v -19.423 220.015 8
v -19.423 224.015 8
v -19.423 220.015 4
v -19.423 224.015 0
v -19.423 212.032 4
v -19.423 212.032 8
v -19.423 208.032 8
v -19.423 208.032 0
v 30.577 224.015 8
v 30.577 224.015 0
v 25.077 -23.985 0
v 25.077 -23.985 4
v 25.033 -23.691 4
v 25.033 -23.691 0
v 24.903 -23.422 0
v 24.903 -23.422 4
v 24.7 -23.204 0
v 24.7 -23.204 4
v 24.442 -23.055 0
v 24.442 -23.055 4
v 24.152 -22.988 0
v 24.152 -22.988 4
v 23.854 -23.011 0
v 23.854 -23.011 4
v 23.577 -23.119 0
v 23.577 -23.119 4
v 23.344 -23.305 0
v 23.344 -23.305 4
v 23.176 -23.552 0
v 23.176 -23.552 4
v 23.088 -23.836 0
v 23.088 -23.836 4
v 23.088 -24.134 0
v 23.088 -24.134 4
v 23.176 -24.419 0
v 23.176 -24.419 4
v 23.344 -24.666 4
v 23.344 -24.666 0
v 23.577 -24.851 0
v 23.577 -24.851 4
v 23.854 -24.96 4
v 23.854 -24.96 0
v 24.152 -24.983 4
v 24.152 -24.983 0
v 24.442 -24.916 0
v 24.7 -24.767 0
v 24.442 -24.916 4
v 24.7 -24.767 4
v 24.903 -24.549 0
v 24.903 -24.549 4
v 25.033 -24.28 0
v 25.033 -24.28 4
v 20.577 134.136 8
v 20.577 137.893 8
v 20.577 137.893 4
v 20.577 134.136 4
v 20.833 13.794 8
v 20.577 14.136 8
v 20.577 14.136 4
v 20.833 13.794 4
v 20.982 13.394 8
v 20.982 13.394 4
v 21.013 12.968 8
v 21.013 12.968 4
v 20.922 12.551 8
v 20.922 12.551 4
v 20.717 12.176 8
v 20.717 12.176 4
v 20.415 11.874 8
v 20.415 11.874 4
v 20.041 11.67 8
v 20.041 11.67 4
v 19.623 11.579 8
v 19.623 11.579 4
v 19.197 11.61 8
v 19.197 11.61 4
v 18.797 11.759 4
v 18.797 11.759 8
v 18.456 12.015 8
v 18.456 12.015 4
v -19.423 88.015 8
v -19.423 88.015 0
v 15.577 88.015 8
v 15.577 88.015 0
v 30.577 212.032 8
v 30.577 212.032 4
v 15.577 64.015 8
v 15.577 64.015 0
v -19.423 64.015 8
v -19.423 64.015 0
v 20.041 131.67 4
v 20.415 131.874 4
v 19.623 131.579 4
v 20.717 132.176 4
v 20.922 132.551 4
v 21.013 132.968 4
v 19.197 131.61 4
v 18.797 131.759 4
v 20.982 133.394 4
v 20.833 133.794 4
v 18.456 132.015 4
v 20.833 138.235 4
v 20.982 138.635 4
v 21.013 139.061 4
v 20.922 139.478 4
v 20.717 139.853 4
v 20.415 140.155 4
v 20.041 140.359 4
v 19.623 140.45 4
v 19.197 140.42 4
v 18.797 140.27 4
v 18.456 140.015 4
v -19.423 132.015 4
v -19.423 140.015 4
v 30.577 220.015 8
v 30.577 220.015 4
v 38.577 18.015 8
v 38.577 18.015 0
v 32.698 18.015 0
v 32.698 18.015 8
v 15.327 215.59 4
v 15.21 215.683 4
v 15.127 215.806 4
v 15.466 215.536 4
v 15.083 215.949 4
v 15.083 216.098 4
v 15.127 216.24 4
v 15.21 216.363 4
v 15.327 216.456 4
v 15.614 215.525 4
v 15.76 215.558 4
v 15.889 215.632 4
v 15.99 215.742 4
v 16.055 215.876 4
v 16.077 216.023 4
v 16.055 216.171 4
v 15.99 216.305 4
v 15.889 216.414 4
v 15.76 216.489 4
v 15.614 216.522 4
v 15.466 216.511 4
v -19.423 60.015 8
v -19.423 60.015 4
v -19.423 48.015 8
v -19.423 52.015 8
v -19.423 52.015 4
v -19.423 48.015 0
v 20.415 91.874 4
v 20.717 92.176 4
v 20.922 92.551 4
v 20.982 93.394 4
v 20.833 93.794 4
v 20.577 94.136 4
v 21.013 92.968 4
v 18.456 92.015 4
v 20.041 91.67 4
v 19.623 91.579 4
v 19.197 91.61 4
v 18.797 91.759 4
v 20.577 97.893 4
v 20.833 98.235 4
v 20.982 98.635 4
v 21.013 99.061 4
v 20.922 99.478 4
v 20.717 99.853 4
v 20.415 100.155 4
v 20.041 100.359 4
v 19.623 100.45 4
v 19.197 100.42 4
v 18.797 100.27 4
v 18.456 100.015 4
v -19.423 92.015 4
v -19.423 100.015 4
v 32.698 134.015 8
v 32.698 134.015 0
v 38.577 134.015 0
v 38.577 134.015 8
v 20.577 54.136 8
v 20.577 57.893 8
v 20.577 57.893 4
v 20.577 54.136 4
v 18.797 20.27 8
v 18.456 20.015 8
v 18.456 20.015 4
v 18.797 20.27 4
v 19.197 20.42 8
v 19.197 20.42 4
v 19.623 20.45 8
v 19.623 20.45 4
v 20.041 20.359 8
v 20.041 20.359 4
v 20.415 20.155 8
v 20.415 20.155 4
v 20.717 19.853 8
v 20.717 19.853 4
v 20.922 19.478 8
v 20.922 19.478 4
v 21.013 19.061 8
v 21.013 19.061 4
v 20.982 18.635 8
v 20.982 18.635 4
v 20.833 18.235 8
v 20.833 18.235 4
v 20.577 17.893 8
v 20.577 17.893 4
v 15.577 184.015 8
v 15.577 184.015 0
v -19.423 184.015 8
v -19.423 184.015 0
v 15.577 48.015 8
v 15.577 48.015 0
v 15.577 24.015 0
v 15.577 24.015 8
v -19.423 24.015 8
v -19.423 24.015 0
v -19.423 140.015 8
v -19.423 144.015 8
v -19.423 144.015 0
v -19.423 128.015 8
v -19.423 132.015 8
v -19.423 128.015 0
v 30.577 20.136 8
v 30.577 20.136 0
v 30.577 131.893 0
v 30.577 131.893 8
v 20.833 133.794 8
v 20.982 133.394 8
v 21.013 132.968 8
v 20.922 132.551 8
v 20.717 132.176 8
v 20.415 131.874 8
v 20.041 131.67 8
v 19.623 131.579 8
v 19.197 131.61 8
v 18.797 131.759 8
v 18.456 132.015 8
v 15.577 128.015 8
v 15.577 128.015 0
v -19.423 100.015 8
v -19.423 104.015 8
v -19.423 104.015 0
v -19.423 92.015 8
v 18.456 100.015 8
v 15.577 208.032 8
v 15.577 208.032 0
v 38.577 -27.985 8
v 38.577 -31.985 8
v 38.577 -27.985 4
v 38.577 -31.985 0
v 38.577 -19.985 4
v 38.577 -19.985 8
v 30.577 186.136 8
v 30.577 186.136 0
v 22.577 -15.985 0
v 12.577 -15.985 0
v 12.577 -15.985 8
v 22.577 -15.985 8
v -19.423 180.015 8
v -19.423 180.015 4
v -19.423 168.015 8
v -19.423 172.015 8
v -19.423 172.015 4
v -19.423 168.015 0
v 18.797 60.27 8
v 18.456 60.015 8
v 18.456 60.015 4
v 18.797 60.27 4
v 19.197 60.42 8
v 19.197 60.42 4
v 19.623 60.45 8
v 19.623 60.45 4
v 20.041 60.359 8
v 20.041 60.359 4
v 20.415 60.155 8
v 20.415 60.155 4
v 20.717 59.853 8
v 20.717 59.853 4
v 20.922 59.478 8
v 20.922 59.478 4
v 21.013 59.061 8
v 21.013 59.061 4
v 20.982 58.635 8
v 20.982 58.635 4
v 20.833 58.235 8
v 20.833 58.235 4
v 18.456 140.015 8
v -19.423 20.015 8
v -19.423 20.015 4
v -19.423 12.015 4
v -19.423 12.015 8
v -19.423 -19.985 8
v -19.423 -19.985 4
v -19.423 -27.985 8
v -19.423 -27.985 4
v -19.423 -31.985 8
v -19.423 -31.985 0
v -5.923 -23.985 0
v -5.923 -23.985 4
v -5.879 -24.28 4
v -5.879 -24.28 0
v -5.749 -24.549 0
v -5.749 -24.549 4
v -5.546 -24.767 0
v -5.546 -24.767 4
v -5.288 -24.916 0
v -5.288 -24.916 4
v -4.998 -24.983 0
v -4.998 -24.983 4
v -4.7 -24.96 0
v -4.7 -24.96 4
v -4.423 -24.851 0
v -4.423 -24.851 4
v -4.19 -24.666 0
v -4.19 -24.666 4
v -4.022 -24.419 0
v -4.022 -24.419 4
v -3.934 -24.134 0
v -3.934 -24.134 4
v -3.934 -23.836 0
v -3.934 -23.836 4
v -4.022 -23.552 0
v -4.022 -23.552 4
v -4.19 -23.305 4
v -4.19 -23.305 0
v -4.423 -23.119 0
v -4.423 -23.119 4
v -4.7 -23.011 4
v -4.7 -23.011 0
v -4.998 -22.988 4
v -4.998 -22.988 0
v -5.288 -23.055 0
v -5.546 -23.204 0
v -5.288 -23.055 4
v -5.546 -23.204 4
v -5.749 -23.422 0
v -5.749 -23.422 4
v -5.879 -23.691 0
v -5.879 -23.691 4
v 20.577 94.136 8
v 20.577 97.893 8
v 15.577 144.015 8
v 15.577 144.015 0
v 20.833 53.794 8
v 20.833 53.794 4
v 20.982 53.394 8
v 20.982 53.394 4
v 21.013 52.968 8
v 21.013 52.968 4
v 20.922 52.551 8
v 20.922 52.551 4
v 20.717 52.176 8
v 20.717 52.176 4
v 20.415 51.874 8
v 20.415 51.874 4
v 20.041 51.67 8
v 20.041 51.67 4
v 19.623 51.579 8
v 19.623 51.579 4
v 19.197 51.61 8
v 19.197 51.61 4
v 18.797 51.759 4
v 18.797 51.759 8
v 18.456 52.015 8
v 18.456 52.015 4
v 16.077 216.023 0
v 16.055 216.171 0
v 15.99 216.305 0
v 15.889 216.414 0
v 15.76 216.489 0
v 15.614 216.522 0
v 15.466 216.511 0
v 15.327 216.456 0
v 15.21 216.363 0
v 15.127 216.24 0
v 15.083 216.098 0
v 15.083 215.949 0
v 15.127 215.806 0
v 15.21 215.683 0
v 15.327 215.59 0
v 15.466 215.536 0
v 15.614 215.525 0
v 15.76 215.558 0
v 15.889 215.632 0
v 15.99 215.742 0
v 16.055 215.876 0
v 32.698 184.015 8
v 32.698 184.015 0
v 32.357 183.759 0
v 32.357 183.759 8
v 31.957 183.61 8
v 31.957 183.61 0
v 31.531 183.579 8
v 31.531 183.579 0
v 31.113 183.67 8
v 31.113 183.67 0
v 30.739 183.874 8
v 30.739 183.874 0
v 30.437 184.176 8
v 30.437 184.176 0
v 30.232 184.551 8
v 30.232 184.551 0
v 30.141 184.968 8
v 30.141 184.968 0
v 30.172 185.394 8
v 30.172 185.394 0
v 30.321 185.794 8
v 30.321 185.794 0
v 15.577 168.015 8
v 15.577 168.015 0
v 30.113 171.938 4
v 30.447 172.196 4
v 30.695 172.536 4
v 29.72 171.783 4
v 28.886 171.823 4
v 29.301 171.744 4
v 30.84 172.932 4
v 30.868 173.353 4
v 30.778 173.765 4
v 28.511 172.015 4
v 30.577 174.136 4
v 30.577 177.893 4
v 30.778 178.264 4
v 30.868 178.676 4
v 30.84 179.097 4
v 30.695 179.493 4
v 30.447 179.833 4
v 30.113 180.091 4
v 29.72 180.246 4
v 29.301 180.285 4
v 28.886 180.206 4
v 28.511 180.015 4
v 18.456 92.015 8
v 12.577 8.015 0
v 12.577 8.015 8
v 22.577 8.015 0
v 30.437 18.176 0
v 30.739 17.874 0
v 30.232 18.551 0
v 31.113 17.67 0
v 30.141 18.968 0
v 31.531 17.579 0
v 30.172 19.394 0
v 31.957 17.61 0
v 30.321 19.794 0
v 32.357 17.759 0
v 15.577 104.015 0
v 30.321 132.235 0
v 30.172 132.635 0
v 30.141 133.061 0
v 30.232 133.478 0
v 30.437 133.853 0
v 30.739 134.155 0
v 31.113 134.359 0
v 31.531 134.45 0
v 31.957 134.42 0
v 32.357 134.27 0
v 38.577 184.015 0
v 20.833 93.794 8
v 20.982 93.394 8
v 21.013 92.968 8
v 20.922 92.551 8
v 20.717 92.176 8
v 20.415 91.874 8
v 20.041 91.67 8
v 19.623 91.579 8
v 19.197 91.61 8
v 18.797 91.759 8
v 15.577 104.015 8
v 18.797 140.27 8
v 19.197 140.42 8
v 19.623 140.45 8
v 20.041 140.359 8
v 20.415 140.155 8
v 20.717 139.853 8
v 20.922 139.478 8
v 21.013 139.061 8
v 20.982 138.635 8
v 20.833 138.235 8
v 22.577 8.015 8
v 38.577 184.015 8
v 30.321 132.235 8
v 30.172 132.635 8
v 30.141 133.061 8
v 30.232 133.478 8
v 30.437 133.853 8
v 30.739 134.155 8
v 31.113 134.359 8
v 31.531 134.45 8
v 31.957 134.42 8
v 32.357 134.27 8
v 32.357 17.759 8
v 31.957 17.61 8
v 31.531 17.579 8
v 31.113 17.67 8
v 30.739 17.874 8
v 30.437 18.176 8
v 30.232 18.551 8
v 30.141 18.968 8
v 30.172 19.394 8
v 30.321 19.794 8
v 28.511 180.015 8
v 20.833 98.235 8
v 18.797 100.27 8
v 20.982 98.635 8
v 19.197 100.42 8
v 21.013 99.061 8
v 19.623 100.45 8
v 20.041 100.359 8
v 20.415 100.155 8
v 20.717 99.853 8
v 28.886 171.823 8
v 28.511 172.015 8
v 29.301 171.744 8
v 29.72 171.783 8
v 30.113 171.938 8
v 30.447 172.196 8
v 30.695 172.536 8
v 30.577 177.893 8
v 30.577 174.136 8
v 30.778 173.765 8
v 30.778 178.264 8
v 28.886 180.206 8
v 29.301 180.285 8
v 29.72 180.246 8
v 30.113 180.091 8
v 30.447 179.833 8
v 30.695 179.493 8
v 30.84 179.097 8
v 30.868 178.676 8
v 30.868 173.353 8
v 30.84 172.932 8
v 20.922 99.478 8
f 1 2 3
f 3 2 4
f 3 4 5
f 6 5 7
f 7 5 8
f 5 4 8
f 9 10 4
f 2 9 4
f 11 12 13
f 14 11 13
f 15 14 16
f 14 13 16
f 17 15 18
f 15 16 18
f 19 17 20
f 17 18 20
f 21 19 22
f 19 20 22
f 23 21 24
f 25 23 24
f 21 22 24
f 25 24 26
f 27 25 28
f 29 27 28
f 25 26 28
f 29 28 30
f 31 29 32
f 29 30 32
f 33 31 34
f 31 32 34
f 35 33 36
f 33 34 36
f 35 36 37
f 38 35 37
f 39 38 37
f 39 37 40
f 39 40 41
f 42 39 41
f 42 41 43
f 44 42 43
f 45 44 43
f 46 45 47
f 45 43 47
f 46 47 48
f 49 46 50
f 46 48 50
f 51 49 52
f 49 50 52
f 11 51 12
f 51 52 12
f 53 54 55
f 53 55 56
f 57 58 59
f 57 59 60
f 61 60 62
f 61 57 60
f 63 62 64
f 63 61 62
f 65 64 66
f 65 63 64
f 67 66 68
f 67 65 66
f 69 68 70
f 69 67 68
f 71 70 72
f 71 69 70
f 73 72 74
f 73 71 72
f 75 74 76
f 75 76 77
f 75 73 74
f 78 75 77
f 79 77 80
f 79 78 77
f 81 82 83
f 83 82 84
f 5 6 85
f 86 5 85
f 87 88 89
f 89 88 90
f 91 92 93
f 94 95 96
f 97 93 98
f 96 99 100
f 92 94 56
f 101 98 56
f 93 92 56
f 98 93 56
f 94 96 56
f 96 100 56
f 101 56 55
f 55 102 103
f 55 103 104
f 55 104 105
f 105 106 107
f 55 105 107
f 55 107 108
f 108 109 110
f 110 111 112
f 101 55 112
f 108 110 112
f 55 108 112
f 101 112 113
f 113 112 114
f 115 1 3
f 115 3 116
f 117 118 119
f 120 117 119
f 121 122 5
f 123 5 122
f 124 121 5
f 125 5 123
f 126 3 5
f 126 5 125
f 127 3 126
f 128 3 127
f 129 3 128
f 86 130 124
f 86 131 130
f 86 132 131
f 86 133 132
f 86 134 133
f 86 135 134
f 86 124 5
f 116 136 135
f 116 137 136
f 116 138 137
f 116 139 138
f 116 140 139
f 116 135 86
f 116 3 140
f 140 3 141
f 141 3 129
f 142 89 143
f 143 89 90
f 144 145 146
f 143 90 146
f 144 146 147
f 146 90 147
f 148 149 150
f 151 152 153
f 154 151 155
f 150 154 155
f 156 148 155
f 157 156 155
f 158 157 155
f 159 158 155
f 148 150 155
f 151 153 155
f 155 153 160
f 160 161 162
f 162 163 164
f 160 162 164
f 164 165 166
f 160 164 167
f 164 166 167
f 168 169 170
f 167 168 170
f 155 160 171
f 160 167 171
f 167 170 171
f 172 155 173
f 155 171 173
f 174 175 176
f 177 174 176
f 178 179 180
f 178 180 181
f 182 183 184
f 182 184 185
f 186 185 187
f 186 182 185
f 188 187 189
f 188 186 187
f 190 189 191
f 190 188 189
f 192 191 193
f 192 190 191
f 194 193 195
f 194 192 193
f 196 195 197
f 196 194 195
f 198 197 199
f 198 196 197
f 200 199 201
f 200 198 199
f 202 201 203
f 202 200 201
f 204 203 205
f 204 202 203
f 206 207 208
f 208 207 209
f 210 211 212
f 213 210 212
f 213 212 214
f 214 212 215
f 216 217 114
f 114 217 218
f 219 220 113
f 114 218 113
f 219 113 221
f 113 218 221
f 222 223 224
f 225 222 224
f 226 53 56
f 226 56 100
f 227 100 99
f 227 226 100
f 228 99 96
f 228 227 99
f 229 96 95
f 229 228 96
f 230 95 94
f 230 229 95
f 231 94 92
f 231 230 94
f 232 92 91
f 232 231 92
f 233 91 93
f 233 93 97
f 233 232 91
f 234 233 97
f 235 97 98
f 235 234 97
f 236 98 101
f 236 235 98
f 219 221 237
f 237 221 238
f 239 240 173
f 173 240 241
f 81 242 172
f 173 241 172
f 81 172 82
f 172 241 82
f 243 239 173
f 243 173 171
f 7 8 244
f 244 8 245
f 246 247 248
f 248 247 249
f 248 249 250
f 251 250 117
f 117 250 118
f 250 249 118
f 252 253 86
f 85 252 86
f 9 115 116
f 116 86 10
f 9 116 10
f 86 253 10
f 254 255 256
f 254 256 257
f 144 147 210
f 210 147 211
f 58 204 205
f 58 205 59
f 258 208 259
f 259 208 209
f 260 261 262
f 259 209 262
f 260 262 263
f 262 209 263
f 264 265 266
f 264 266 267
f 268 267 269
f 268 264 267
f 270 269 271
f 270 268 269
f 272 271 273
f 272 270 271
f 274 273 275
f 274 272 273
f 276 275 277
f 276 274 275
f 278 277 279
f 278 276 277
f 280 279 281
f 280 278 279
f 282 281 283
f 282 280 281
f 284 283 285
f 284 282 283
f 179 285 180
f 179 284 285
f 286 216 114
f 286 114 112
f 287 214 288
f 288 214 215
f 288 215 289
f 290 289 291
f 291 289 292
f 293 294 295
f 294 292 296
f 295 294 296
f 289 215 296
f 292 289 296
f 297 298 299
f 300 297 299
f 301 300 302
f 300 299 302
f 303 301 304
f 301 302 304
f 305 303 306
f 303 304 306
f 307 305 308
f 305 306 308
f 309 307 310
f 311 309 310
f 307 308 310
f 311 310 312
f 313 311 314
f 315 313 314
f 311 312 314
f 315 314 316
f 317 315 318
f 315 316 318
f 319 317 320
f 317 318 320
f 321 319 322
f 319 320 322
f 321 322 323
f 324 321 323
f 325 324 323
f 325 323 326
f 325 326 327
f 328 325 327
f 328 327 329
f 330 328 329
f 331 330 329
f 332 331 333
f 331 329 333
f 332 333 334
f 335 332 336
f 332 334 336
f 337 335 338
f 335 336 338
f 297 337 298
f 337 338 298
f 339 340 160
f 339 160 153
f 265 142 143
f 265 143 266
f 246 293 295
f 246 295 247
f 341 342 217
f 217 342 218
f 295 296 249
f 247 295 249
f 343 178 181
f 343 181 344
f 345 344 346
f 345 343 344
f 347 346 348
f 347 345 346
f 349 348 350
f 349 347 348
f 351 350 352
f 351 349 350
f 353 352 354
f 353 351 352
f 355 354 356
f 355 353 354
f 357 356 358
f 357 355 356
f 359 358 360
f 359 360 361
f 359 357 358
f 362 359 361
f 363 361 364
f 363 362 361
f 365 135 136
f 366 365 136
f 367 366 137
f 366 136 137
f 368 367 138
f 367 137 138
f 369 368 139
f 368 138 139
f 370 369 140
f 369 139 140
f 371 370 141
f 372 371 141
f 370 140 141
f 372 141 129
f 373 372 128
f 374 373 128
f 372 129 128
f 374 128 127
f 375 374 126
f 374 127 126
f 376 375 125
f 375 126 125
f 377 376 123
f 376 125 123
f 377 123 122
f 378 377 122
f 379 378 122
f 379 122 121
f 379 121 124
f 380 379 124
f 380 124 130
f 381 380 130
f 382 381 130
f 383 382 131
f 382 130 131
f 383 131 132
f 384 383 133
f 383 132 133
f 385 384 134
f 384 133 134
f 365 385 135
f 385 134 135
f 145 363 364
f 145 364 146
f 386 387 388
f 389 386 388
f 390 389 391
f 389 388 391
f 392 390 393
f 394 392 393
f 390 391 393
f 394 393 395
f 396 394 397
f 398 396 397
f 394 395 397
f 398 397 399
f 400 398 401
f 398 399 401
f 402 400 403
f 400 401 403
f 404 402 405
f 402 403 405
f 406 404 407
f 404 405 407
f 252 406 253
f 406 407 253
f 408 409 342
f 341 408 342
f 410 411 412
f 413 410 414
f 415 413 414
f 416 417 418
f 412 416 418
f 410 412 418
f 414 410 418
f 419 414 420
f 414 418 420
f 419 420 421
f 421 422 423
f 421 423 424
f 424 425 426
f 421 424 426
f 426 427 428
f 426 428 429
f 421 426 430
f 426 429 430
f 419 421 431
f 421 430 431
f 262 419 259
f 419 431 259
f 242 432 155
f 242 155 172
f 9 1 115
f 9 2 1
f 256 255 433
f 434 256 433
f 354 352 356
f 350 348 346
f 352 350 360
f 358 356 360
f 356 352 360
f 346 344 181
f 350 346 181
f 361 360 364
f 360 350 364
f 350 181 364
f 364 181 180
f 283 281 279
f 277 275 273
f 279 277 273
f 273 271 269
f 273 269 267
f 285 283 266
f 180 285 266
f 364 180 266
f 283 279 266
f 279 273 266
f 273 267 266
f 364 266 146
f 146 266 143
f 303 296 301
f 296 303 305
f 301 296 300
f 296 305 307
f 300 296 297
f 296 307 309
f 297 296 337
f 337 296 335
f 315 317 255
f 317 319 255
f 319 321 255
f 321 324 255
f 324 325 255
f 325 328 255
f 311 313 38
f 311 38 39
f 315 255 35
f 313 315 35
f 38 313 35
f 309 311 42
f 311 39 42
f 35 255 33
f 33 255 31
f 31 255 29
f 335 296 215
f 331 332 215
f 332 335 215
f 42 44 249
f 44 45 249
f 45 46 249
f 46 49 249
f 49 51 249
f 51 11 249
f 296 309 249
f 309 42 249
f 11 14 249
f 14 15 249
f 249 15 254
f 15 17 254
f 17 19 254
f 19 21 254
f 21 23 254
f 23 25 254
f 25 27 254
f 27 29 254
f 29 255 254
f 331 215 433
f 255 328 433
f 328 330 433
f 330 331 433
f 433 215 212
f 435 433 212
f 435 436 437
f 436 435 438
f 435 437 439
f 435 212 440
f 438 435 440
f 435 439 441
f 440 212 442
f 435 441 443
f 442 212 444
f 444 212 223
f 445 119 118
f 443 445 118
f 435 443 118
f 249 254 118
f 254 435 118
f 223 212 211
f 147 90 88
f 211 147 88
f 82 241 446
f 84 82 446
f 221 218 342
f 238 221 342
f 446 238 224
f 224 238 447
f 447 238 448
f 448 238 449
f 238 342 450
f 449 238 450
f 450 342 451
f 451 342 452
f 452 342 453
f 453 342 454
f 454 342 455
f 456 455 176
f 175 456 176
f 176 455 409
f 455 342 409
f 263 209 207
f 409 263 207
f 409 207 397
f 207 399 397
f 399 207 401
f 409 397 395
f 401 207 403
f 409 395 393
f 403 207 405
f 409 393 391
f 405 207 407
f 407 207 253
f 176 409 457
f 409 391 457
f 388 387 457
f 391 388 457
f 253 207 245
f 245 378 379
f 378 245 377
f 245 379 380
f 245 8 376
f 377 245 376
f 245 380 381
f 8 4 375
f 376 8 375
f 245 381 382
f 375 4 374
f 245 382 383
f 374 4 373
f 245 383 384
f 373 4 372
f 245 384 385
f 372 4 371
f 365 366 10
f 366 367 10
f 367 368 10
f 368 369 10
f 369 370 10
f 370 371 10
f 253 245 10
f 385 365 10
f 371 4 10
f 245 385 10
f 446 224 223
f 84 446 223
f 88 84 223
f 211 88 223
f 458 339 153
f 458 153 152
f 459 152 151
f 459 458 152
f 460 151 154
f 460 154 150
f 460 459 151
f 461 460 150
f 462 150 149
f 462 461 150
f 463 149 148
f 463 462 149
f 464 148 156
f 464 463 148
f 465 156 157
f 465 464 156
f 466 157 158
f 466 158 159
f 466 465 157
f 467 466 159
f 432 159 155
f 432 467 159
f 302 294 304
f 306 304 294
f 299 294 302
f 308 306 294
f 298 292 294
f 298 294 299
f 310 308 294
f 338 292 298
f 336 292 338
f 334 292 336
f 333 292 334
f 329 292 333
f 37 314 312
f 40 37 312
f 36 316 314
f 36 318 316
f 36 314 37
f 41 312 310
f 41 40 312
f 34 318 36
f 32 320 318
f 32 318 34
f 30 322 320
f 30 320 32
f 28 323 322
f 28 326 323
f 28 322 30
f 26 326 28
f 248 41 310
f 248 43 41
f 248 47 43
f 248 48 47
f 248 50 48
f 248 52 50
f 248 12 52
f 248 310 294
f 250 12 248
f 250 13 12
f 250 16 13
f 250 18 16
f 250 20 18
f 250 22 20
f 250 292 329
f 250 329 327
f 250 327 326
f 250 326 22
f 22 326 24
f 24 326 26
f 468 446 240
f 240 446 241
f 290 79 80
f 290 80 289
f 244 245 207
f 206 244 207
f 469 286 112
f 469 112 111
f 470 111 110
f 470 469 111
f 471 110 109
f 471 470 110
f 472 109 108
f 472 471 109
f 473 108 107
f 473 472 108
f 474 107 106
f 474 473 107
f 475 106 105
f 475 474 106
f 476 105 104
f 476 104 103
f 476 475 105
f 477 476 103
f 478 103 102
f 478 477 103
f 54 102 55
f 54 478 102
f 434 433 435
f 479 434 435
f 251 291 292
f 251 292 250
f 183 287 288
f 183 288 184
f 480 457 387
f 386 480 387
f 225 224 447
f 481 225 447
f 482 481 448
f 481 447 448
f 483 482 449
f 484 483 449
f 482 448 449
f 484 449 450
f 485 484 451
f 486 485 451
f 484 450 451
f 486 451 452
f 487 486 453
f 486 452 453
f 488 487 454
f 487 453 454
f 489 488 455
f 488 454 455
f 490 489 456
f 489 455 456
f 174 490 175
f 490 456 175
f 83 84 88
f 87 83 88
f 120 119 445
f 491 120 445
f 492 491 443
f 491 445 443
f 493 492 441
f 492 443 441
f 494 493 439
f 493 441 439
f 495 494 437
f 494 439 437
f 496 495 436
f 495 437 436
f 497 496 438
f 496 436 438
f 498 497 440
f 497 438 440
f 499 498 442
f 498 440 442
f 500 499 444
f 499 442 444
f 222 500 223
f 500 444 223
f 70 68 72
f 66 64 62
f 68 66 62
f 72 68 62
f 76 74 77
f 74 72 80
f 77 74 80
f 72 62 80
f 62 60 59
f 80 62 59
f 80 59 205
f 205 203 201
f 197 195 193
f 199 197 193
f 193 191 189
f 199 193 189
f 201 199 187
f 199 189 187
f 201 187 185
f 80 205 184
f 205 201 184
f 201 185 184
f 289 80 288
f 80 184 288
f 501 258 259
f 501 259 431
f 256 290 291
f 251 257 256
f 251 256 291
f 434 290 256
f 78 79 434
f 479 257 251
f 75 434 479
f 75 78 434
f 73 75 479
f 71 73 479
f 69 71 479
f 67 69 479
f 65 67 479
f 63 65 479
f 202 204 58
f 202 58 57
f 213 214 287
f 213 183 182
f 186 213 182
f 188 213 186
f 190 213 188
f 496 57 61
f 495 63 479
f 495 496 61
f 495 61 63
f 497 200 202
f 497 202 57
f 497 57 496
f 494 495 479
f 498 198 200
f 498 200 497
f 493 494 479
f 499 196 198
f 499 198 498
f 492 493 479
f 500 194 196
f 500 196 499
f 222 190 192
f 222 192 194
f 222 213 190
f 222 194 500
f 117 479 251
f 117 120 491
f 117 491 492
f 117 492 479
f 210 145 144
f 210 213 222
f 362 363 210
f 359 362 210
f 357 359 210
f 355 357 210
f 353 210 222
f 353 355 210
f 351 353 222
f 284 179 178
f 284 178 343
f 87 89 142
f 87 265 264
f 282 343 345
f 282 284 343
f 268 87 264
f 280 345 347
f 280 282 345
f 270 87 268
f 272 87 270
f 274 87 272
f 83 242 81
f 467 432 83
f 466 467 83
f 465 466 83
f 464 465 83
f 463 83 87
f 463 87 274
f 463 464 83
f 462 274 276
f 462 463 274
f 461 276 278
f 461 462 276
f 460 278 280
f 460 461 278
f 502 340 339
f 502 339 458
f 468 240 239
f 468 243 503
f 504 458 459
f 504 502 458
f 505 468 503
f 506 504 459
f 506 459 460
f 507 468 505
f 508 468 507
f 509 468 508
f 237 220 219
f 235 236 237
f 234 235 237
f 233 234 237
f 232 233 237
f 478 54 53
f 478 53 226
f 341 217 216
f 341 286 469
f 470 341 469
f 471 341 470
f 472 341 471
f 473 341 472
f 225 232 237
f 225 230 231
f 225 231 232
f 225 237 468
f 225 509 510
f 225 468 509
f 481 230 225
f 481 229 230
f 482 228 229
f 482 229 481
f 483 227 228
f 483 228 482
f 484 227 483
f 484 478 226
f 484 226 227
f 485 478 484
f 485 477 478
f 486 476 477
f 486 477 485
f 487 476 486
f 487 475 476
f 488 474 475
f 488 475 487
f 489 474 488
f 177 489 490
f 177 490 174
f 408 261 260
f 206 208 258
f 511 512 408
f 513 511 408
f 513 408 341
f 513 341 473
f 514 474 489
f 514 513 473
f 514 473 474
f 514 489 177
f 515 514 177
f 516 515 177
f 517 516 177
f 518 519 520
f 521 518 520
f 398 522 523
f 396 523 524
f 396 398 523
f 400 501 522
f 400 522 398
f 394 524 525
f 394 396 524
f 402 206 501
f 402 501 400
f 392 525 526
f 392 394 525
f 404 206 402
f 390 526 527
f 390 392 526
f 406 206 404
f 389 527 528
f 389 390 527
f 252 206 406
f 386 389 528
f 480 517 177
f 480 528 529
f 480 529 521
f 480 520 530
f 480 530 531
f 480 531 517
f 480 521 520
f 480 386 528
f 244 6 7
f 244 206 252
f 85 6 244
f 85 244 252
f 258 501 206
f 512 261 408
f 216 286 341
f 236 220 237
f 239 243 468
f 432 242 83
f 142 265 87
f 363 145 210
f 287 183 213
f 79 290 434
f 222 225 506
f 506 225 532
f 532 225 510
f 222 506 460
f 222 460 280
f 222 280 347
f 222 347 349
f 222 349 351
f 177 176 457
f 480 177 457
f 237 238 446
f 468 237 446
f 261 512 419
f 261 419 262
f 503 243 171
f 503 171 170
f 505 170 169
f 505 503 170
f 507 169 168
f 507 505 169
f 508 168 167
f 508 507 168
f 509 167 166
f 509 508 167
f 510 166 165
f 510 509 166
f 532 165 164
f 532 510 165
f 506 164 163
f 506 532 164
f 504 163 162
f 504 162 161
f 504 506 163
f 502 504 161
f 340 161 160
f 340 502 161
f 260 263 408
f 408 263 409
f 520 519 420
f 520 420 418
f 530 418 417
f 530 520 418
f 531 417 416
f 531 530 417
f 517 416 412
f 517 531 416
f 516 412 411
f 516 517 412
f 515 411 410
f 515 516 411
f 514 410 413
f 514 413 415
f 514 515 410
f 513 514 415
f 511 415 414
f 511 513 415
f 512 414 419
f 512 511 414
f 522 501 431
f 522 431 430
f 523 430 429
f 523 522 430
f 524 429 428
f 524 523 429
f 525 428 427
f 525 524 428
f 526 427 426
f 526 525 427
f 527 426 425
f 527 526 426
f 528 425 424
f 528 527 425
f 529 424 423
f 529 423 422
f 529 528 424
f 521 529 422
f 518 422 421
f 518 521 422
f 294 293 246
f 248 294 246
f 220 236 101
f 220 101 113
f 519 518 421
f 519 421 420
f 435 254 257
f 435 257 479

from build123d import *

# Parameters (mm, degrees)
ESQUISSE1_W             = 10
ESQUISSE1_H             = 24
BOSS_EXTRU_1_DEPTH      = 8
ESQUISSE2_W             = 53.566329485
ESQUISSE2_H             = 7.982626226
ESQUISSE2_W_2           = 58
ESQUISSE2_H_2           = 8
ENL_V_MAT_EXTRU_1_DEPTH = 4
ESQUISSE3_R             = 0.5
ESQUISSE3_R_2           = 1
ENL_V_MAT_EXTRU_2_DEPTH = 4


with BuildPart() as part:
    # Esquisse1 → Boss.-Extru.1 (new body)
    with BuildSketch(Plane.XY):
        with BuildLine():
            Line((30.577007139, 186.135890651), (30.577007139, 224.014570308))
            Line((30.577007139, 224.014570308), (-19.422992861, 224.014570308))
            Line((-19.422992861, 224.014570308), (-19.422992861, 208.031944082))
            Line((-19.422992861, 208.031944082), (15.577007139, 208.031944082))
            Line((15.577007139, 208.031944082), (15.577007139, 184.014570308))
            Line((15.577007139, 184.014570308), (-19.422992861, 184.014570308))
            Line((-19.422992861, 184.014570308), (-19.422992861, 168.014570308))
            Line((-19.422992861, 168.014570308), (15.577007139, 168.014570308))
            Line((15.577007139, 168.014570308), (15.577007139, 144.014570308))
            Line((15.577007139, 144.014570308), (-19.422992861, 144.014570308))
            Line((-19.422992861, 144.014570308), (-19.422992861, 128.014570308))
            Line((-19.422992861, 128.014570308), (15.577007139, 128.014570308))
            Line((15.577007139, 128.014570308), (15.577007139, 104.014570308))
            Line((15.577007139, 104.014570308), (-19.422992861, 104.014570308))
            Line((-19.422992861, 104.014570308), (-19.422992861, 88.014570308))
            Line((-19.422992861, 88.014570308), (15.577007139, 88.014570308))
            Line((15.577007139, 88.014570308), (15.577007139, 64.014570308))
            Line((15.577007139, 64.014570308), (-19.422992861, 64.014570308))
            Line((-19.422992861, 64.014570308), (-19.422992861, 48.014570308))
            Line((-19.422992861, 48.014570308), (15.577007139, 48.014570308))
            Line((15.577007139, 48.014570308), (15.577007139, 24.014570308))
            Line((15.577007139, 24.014570308), (-19.422992861, 24.014570308))
            Line((-19.422992861, 24.014570308), (-19.422992861, -31.985429692))
            Line((-19.422992861, -31.985429692), (30.577007139, -31.985429692))
            Line((30.577007139, -31.985429692), (38.577007139, -31.985429692))
            Line((38.577007139, -31.985429692), (38.577007139, 18.014570308))
            Line((38.577007139, 18.014570308), (32.698327483, 18.014570308))
            ThreePointArc((32.698327483, 18.014570308), (30.577007139, 18.014570308), (30.577007139, 20.135890651))
            Line((30.577007139, 20.135890651), (30.577007139, 131.893249964))
            ThreePointArc((30.577007139, 131.893249964), (30.577007139, 134.014570308), (32.698327483, 134.014570308))
            Line((32.698327483, 134.014570308), (38.577007139, 134.014570308))
            Line((38.577007139, 134.014570308), (38.577007139, 184.014570308))
            Line((38.577007139, 184.014570308), (32.698327483, 184.014570308))
            ThreePointArc((32.698327483, 184.014570308), (30.577007139, 184.014570308), (30.577007139, 186.135890651))
        make_face()
        with Locations((17.577007139, -3.985429692)):
            Rectangle(ESQUISSE1_W, ESQUISSE1_H, mode=Mode.SUBTRACT)
    extrude(amount=BOSS_EXTRU_1_DEPTH)

    # Esquisse2 → Enlèv. mat.-Extru.1 (cut)
    with BuildSketch(Plane.XY.offset(8)):
        with BuildLine():
            Line((-19.422992861, 140.014570308), (18.455686796, 140.014570308))
            ThreePointArc((18.455686796, 140.014570308), (20.577007139, 140.014570308), (20.577007139, 137.893249964))
            Line((20.577007139, 137.893249964), (20.577007139, 134.135890651))
            ThreePointArc((20.577007139, 134.135890651), (20.577007139, 132.014570308), (18.455686796, 132.014570308))
            Line((18.455686796, 132.014570308), (-19.422992861, 132.014570308))
            Line((-19.422992861, 132.014570308), (-19.422992861, 140.014570308))
        make_face()
        with BuildLine():
            Line((-19.422992861, 100.014570308), (18.455686796, 100.014570308))
            ThreePointArc((18.455686796, 100.014570308), (20.577007139, 100.014570308), (20.577007139, 97.893249964))
            Line((20.577007139, 97.893249964), (20.577007139, 94.135890651))
            ThreePointArc((20.577007139, 94.135890651), (20.577007139, 92.014570308), (18.455686796, 92.014570308))
            Line((18.455686796, 92.014570308), (-19.422992861, 92.014570308))
            Line((-19.422992861, 92.014570308), (-19.422992861, 100.014570308))
        make_face()
        with BuildLine():
            Line((-19.422992861, 60.014570308), (18.455686796, 60.014570308))
            ThreePointArc((18.455686796, 60.014570308), (20.577007139, 60.014570308), (20.577007139, 57.893249964))
            Line((20.577007139, 57.893249964), (20.577007139, 54.135890651))
            ThreePointArc((20.577007139, 54.135890651), (20.577007139, 52.014570308), (18.455686796, 52.014570308))
            Line((18.455686796, 52.014570308), (-19.422992861, 52.014570308))
            Line((-19.422992861, 52.014570308), (-19.422992861, 60.014570308))
        make_face()
        with BuildLine():
            Line((-19.422992861, 180.014570308), (28.510535818, 180.014570308))
            ThreePointArc((28.510535818, 180.014570308), (30.446580511, 179.833376068), (30.577007139, 177.893249964))
            Line((30.577007139, 177.893249964), (30.577007139, 174.135890651))
            ThreePointArc((30.577007139, 174.135890651), (30.446580511, 172.195764547), (28.510535818, 172.014570308))
            Line((28.510535818, 172.014570308), (-19.422992861, 172.014570308))
            Line((-19.422992861, 172.014570308), (-19.422992861, 180.014570308))
        make_face()
        with BuildLine():
            Line((-19.422992861, 20.014570308), (18.455686796, 20.014570308))
            ThreePointArc((18.455686796, 20.014570308), (20.577007139, 20.014570308), (20.577007139, 17.893249964))
            Line((20.577007139, 17.893249964), (20.577007139, 14.135890651))
            ThreePointArc((20.577007139, 14.135890651), (20.577007139, 12.014570308), (18.455686796, 12.014570308))
            Line((18.455686796, 12.014570308), (-19.422992861, 12.014570308))
            Line((-19.422992861, 12.014570308), (-19.422992861, 20.014570308))
        make_face()
        with Locations((7.360171881, 216.023257195)):
            Rectangle(ESQUISSE2_W, ESQUISSE2_H)
        with Locations((9.577007139, -23.985429692)):
            Rectangle(ESQUISSE2_W_2, ESQUISSE2_H_2)
    extrude(amount=-ENL_V_MAT_EXTRU_1_DEPTH, mode=Mode.SUBTRACT)

    # Esquisse3 → Enlèv. mat.-Extru.2 (cut)
    with BuildSketch(Plane.XY.offset(4)):
        with Locations((15.577007139, 216.023257195)):
            Circle(ESQUISSE3_R)
        with Locations((24.077007139, -23.985429692)):
            Circle(ESQUISSE3_R_2)
        with Locations(Location((-4.922992861, -23.985429692, 0), (0, 0, 180))):
            Circle(ESQUISSE3_R_2)
    extrude(amount=-ENL_V_MAT_EXTRU_2_DEPTH, mode=Mode.SUBTRACT)


solid = part.part
